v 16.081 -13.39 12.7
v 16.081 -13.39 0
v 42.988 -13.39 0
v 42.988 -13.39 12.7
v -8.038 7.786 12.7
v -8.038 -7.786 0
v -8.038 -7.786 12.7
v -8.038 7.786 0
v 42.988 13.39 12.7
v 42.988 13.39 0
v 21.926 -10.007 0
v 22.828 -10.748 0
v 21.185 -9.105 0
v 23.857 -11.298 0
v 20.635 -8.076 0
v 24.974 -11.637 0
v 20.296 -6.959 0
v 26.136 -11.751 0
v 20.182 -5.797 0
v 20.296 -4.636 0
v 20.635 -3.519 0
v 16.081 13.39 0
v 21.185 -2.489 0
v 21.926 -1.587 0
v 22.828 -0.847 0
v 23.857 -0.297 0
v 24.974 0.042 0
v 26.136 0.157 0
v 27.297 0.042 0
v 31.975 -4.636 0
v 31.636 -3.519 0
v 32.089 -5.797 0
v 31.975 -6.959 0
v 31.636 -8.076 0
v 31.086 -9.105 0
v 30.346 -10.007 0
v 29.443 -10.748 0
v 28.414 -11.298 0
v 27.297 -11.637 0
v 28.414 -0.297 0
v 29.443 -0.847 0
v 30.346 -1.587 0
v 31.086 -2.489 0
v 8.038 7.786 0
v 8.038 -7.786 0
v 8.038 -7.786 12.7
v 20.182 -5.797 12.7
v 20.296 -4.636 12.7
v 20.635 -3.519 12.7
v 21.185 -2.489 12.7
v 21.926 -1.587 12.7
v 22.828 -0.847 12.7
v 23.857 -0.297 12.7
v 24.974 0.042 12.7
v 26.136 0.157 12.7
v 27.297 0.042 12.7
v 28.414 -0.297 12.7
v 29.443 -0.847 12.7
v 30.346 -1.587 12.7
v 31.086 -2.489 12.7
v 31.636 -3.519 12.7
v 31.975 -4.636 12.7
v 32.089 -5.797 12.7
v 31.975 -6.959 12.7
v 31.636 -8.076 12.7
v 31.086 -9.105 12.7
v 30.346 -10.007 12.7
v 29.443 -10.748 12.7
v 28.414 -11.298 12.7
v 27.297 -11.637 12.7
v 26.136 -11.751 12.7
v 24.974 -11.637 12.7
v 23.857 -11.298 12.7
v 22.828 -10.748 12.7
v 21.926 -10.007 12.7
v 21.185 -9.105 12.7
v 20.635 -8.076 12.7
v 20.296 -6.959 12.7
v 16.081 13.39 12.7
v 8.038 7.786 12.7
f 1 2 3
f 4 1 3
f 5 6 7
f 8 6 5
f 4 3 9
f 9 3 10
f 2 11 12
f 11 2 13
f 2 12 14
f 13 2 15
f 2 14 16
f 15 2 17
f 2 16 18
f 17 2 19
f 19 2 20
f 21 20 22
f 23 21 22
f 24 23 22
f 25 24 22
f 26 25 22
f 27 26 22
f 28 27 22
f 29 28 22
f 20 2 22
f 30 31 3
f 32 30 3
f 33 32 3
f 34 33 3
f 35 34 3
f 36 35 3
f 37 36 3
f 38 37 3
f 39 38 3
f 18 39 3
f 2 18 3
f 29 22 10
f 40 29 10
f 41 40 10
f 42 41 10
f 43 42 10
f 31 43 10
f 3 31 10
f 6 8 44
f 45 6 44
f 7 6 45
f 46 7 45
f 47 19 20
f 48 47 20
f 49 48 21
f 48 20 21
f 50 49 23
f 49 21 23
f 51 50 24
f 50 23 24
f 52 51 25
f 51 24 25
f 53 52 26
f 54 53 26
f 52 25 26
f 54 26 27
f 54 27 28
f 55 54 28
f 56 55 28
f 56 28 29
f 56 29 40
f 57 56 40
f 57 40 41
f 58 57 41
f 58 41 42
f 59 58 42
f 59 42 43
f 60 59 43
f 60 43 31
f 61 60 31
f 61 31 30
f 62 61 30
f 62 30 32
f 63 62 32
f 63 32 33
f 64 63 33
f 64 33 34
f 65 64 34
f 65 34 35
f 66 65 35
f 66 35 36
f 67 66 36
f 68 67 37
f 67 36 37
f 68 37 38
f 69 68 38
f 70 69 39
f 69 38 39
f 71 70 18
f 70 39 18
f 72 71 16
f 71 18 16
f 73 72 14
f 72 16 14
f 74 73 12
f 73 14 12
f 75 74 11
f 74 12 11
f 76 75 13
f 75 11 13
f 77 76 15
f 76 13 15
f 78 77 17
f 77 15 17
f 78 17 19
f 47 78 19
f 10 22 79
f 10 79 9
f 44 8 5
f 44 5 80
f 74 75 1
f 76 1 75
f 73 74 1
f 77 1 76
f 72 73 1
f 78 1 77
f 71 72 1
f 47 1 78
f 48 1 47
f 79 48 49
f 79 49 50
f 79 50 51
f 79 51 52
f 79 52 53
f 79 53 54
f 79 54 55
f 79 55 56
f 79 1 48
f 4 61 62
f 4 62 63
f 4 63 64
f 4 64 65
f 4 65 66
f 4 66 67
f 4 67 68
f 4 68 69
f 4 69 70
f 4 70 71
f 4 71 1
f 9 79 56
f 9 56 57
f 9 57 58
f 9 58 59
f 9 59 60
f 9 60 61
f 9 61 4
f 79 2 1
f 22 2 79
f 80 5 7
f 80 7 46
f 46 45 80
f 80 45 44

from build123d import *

# Parameters (mm, degrees)
F0_W     = 16.0754136741
F0_H     = 15.571044758
F1_DEPTH = 12.7
F2_W     = 26.9069522619
F2_H     = 26.7808251083
F3_DEPTH = 12.7
F5_D     = 11.90752


with BuildPart() as f1:
    # F0 (on Top) → F1 (new body)
    with BuildSketch(Plane.XY):
        Rectangle(F0_W, F0_H)
    extrude(amount=F1_DEPTH)


with BuildPart() as f3:
    # F2 (on Top) → F3 (new body)
    with BuildSketch(Plane.XY):
        with Locations((29.5344181359, 0)):
            Rectangle(F2_W, F2_H)
    extrude(amount=F3_DEPTH)

    # F5 (through all)
    with Locations(Plane.XY.offset(12.7)):
        with Locations((26.135681197, -5.7972129434)):
            Hole(F5_D / 2)


solid = Compound([f1.part, f3.part])
